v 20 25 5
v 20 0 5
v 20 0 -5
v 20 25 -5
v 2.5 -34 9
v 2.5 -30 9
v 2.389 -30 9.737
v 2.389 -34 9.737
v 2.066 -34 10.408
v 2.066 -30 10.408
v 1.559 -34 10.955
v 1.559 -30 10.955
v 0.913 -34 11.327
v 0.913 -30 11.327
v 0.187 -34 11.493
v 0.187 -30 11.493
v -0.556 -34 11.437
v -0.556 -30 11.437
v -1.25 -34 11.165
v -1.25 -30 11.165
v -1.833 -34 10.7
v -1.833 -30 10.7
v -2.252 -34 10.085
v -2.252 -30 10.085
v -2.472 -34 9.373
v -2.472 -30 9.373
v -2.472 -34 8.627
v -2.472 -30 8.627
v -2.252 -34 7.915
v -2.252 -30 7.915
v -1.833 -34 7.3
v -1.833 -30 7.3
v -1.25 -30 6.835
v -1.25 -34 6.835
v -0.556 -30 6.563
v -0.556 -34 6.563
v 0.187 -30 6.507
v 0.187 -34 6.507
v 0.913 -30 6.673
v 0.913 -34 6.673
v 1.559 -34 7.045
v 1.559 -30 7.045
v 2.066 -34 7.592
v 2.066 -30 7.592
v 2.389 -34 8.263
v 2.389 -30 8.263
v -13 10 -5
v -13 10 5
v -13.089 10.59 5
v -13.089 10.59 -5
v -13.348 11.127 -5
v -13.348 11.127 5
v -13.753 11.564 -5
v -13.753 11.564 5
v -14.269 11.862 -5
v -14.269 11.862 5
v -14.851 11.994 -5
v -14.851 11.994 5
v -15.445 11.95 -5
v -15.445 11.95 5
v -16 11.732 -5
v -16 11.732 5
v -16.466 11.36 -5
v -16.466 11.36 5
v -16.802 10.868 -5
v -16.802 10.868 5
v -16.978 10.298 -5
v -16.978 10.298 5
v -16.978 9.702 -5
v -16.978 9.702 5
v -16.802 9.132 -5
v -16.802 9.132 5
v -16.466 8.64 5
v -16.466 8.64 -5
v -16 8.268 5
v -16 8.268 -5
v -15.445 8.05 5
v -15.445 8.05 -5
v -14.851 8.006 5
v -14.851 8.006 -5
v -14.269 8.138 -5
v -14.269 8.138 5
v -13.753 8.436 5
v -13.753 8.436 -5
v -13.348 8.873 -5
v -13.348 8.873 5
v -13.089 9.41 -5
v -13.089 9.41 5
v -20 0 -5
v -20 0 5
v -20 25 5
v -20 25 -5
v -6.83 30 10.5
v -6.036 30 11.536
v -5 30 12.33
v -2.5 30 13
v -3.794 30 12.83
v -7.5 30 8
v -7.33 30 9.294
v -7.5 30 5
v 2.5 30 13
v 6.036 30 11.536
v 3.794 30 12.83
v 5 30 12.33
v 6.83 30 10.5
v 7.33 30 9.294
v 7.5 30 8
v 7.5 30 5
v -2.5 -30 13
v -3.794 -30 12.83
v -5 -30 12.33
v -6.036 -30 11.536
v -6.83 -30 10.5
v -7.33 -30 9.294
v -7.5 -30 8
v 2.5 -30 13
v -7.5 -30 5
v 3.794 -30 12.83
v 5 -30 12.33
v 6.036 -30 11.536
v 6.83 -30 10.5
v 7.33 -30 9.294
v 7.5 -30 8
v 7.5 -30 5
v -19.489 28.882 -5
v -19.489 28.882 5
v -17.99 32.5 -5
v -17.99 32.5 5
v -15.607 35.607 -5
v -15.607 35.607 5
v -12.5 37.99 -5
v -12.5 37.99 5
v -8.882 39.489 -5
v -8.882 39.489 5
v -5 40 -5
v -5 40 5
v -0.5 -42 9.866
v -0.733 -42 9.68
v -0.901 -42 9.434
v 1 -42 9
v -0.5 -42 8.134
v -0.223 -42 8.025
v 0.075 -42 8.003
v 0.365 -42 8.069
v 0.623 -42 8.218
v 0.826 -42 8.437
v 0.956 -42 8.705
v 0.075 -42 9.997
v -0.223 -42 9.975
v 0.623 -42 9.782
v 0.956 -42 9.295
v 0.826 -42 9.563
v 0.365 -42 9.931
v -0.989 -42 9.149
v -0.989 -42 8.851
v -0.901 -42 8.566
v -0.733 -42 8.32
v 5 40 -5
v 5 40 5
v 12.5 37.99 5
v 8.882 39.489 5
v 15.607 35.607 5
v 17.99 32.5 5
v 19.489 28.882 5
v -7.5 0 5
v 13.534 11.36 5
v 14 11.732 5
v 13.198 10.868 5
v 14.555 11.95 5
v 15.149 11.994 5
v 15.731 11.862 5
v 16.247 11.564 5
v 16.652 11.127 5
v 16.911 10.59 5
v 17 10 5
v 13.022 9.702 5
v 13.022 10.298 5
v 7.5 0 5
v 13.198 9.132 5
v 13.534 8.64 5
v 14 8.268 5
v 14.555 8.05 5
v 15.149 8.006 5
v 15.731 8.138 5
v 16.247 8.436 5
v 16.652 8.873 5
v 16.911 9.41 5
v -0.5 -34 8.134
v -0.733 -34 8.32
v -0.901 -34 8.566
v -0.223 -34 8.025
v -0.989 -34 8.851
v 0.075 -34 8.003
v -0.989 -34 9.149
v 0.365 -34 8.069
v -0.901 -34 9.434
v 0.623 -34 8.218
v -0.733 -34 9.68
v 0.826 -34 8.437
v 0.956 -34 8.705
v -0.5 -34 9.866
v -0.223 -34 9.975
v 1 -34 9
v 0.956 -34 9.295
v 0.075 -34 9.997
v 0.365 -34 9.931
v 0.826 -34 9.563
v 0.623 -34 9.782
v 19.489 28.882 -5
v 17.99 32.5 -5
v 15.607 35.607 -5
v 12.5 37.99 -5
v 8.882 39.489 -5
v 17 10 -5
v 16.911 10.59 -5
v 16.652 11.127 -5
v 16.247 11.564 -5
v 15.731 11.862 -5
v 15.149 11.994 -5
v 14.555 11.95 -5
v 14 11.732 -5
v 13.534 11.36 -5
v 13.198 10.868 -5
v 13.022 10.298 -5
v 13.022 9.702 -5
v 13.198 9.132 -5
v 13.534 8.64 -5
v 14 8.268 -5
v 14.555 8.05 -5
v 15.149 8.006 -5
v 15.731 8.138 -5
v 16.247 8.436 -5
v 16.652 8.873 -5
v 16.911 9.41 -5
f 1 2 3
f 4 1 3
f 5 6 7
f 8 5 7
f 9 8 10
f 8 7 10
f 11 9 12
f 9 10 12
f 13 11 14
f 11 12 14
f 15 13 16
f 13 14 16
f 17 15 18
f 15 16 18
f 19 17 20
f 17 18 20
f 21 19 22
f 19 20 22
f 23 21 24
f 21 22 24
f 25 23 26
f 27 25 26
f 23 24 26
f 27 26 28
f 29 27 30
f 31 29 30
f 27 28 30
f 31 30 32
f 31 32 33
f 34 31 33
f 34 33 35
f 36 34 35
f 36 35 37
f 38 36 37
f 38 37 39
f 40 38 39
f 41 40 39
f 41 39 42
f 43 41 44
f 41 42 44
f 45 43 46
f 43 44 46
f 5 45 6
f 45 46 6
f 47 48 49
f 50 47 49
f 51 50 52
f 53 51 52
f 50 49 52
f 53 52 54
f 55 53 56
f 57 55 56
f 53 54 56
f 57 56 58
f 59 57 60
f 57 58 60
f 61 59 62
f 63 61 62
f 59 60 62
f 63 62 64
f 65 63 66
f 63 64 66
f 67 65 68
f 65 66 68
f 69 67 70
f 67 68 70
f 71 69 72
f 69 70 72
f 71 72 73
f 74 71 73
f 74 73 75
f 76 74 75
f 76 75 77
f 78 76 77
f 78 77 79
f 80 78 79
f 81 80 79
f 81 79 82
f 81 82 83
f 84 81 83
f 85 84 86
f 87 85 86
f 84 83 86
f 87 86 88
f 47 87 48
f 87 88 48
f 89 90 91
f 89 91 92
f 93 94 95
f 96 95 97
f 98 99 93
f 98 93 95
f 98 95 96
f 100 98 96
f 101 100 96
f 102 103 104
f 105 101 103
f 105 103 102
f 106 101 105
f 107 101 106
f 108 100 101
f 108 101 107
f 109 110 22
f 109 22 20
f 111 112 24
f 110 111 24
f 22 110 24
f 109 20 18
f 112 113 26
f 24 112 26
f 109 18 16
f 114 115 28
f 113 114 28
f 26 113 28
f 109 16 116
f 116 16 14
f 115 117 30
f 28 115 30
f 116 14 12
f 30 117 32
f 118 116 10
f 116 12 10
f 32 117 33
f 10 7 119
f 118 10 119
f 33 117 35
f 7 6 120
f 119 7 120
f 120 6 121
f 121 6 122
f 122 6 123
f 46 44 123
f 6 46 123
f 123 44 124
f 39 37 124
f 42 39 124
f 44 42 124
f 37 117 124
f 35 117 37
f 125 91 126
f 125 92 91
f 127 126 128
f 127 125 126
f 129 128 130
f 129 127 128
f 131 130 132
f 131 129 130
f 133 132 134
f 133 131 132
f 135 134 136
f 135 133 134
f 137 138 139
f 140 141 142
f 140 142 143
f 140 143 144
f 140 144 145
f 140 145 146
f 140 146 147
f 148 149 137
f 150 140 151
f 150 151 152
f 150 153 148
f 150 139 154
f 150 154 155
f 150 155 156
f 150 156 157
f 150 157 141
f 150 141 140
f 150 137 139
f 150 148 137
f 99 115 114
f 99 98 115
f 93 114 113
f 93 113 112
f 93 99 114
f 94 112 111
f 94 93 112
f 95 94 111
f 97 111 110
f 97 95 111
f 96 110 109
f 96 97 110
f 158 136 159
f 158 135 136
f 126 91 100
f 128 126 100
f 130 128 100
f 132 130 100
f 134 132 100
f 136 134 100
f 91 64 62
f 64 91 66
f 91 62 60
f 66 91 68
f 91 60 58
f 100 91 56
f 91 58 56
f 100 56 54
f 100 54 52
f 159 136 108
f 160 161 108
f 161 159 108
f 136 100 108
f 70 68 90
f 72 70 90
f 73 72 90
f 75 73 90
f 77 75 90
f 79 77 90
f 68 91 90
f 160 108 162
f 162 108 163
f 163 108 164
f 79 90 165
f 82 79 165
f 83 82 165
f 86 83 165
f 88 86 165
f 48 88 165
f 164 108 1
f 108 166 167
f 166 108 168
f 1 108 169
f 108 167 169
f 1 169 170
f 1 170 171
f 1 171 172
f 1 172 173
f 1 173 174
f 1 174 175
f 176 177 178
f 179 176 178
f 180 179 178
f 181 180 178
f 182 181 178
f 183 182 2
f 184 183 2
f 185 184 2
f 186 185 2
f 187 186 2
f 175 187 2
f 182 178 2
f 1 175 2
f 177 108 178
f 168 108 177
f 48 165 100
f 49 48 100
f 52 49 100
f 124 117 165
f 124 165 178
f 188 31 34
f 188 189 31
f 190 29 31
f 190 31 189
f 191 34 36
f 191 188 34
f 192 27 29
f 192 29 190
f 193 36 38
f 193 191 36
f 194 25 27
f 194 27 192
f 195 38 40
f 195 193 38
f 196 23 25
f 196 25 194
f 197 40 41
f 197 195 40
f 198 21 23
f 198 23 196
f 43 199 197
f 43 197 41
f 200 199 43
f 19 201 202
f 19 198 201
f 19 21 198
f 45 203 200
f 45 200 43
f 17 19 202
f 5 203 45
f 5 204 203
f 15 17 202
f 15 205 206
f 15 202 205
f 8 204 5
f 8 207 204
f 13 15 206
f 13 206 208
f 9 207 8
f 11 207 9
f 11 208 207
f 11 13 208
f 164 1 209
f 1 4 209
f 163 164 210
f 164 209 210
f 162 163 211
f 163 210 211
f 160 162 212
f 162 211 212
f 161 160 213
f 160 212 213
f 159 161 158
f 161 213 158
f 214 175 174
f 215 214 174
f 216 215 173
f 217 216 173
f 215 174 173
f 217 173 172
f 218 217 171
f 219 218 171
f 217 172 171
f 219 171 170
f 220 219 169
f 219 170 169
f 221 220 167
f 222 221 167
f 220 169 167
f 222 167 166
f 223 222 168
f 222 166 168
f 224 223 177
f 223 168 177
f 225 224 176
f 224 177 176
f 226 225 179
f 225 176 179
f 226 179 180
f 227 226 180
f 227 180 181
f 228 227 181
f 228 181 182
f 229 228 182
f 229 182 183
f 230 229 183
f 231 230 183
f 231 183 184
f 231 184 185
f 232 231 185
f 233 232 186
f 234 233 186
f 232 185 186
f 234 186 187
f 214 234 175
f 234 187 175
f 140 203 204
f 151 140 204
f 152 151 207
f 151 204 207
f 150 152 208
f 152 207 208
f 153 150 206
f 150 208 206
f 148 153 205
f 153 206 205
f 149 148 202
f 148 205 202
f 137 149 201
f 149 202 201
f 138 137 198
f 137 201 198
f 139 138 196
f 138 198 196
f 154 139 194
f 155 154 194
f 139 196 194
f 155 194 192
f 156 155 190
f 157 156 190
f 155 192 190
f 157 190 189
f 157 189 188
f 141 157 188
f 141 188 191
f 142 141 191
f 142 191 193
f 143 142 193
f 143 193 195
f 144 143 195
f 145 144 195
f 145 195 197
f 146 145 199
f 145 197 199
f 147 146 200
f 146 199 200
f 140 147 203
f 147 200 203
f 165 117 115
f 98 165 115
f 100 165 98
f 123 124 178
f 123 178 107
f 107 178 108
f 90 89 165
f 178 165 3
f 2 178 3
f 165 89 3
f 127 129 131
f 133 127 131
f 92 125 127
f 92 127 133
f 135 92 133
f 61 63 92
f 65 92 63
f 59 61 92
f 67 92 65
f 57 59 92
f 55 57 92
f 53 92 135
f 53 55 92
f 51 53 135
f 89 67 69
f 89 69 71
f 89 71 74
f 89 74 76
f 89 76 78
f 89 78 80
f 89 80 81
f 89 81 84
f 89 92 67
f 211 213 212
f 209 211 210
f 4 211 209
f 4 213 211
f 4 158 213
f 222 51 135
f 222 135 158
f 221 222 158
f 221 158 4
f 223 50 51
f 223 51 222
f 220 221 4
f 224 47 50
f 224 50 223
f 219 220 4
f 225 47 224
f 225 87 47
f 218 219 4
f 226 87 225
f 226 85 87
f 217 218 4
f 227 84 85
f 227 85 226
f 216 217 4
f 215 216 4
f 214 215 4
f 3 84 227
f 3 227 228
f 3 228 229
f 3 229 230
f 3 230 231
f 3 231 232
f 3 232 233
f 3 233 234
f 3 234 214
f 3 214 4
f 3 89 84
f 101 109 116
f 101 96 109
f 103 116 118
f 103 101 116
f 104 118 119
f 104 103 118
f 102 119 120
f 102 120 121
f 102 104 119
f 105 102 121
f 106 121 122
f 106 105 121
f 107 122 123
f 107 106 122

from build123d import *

# Parameters (mm, degrees)
SKETCH1_W           = 40
SKETCH1_H           = 10
BOSS_EXTRUDE1_DEPTH = 40
FILLET1_R           = 15
SKETCH3_R           = 2
CUT_EXTRUDE1_DEPTH  = 10
SKETCH7_W           = 15
SKETCH7_H           = 60
BOSS_EXTRUDE5_DEPTH = 8
SKETCH8_R           = 2.5
BOSS_EXTRUDE6_DEPTH = 4
SKETCH9_R           = 1
BOSS_EXTRUDE7_DEPTH = 8
FILLET3_R           = 5


with BuildPart() as part:
    # Sketch1 → Boss-Extrude1 (new body)
    with BuildSketch(Plane(origin=(0, 0, 0), x_dir=(1, 0, 0), z_dir=(0, 1, 0))):
        Rectangle(SKETCH1_W, SKETCH1_H)
    extrude(amount=BOSS_EXTRUDE1_DEPTH)

    # Fillet1
    fillet1_edges = [part.edges().sort_by_distance(p)[0] for p in [
        (-20, 40, 0),
        (20, 40, 0),
    ]]
    fillet(fillet1_edges, radius=FILLET1_R)

    # Sketch3 → Cut-Extrude1 (cut)
    with BuildSketch(Plane.XY.offset(5)):
        with Locations((15, 10)):
            Circle(SKETCH3_R)
        with Locations((-15, 10)):
            Circle(SKETCH3_R)
    extrude(amount=-CUT_EXTRUDE1_DEPTH, mode=Mode.SUBTRACT)

    # Sketch7 → Boss-Extrude5 (add)
    with BuildSketch(Plane.XY.offset(5)):
        Rectangle(SKETCH7_W, SKETCH7_H)
    extrude(amount=BOSS_EXTRUDE5_DEPTH)

    # Sketch8 → Boss-Extrude6 (add)
    with BuildSketch(Plane.XZ.offset(30)):
        with Locations((0, 9)):
            Circle(SKETCH8_R)
    extrude(amount=BOSS_EXTRUDE6_DEPTH)

    # Sketch9 → Boss-Extrude7 (add)
    with BuildSketch(Plane.XZ.offset(34)):
        with Locations((0, 9)):
            Circle(SKETCH9_R)
    extrude(amount=BOSS_EXTRUDE7_DEPTH)

    # Fillet3
    fillet3_edges = [part.edges().sort_by_distance(p)[0] for p in [
        (7.5, 0, 13),
        (-7.5, 0, 13),
    ]]
    fillet(fillet3_edges, radius=FILLET3_R)


solid = part.part
